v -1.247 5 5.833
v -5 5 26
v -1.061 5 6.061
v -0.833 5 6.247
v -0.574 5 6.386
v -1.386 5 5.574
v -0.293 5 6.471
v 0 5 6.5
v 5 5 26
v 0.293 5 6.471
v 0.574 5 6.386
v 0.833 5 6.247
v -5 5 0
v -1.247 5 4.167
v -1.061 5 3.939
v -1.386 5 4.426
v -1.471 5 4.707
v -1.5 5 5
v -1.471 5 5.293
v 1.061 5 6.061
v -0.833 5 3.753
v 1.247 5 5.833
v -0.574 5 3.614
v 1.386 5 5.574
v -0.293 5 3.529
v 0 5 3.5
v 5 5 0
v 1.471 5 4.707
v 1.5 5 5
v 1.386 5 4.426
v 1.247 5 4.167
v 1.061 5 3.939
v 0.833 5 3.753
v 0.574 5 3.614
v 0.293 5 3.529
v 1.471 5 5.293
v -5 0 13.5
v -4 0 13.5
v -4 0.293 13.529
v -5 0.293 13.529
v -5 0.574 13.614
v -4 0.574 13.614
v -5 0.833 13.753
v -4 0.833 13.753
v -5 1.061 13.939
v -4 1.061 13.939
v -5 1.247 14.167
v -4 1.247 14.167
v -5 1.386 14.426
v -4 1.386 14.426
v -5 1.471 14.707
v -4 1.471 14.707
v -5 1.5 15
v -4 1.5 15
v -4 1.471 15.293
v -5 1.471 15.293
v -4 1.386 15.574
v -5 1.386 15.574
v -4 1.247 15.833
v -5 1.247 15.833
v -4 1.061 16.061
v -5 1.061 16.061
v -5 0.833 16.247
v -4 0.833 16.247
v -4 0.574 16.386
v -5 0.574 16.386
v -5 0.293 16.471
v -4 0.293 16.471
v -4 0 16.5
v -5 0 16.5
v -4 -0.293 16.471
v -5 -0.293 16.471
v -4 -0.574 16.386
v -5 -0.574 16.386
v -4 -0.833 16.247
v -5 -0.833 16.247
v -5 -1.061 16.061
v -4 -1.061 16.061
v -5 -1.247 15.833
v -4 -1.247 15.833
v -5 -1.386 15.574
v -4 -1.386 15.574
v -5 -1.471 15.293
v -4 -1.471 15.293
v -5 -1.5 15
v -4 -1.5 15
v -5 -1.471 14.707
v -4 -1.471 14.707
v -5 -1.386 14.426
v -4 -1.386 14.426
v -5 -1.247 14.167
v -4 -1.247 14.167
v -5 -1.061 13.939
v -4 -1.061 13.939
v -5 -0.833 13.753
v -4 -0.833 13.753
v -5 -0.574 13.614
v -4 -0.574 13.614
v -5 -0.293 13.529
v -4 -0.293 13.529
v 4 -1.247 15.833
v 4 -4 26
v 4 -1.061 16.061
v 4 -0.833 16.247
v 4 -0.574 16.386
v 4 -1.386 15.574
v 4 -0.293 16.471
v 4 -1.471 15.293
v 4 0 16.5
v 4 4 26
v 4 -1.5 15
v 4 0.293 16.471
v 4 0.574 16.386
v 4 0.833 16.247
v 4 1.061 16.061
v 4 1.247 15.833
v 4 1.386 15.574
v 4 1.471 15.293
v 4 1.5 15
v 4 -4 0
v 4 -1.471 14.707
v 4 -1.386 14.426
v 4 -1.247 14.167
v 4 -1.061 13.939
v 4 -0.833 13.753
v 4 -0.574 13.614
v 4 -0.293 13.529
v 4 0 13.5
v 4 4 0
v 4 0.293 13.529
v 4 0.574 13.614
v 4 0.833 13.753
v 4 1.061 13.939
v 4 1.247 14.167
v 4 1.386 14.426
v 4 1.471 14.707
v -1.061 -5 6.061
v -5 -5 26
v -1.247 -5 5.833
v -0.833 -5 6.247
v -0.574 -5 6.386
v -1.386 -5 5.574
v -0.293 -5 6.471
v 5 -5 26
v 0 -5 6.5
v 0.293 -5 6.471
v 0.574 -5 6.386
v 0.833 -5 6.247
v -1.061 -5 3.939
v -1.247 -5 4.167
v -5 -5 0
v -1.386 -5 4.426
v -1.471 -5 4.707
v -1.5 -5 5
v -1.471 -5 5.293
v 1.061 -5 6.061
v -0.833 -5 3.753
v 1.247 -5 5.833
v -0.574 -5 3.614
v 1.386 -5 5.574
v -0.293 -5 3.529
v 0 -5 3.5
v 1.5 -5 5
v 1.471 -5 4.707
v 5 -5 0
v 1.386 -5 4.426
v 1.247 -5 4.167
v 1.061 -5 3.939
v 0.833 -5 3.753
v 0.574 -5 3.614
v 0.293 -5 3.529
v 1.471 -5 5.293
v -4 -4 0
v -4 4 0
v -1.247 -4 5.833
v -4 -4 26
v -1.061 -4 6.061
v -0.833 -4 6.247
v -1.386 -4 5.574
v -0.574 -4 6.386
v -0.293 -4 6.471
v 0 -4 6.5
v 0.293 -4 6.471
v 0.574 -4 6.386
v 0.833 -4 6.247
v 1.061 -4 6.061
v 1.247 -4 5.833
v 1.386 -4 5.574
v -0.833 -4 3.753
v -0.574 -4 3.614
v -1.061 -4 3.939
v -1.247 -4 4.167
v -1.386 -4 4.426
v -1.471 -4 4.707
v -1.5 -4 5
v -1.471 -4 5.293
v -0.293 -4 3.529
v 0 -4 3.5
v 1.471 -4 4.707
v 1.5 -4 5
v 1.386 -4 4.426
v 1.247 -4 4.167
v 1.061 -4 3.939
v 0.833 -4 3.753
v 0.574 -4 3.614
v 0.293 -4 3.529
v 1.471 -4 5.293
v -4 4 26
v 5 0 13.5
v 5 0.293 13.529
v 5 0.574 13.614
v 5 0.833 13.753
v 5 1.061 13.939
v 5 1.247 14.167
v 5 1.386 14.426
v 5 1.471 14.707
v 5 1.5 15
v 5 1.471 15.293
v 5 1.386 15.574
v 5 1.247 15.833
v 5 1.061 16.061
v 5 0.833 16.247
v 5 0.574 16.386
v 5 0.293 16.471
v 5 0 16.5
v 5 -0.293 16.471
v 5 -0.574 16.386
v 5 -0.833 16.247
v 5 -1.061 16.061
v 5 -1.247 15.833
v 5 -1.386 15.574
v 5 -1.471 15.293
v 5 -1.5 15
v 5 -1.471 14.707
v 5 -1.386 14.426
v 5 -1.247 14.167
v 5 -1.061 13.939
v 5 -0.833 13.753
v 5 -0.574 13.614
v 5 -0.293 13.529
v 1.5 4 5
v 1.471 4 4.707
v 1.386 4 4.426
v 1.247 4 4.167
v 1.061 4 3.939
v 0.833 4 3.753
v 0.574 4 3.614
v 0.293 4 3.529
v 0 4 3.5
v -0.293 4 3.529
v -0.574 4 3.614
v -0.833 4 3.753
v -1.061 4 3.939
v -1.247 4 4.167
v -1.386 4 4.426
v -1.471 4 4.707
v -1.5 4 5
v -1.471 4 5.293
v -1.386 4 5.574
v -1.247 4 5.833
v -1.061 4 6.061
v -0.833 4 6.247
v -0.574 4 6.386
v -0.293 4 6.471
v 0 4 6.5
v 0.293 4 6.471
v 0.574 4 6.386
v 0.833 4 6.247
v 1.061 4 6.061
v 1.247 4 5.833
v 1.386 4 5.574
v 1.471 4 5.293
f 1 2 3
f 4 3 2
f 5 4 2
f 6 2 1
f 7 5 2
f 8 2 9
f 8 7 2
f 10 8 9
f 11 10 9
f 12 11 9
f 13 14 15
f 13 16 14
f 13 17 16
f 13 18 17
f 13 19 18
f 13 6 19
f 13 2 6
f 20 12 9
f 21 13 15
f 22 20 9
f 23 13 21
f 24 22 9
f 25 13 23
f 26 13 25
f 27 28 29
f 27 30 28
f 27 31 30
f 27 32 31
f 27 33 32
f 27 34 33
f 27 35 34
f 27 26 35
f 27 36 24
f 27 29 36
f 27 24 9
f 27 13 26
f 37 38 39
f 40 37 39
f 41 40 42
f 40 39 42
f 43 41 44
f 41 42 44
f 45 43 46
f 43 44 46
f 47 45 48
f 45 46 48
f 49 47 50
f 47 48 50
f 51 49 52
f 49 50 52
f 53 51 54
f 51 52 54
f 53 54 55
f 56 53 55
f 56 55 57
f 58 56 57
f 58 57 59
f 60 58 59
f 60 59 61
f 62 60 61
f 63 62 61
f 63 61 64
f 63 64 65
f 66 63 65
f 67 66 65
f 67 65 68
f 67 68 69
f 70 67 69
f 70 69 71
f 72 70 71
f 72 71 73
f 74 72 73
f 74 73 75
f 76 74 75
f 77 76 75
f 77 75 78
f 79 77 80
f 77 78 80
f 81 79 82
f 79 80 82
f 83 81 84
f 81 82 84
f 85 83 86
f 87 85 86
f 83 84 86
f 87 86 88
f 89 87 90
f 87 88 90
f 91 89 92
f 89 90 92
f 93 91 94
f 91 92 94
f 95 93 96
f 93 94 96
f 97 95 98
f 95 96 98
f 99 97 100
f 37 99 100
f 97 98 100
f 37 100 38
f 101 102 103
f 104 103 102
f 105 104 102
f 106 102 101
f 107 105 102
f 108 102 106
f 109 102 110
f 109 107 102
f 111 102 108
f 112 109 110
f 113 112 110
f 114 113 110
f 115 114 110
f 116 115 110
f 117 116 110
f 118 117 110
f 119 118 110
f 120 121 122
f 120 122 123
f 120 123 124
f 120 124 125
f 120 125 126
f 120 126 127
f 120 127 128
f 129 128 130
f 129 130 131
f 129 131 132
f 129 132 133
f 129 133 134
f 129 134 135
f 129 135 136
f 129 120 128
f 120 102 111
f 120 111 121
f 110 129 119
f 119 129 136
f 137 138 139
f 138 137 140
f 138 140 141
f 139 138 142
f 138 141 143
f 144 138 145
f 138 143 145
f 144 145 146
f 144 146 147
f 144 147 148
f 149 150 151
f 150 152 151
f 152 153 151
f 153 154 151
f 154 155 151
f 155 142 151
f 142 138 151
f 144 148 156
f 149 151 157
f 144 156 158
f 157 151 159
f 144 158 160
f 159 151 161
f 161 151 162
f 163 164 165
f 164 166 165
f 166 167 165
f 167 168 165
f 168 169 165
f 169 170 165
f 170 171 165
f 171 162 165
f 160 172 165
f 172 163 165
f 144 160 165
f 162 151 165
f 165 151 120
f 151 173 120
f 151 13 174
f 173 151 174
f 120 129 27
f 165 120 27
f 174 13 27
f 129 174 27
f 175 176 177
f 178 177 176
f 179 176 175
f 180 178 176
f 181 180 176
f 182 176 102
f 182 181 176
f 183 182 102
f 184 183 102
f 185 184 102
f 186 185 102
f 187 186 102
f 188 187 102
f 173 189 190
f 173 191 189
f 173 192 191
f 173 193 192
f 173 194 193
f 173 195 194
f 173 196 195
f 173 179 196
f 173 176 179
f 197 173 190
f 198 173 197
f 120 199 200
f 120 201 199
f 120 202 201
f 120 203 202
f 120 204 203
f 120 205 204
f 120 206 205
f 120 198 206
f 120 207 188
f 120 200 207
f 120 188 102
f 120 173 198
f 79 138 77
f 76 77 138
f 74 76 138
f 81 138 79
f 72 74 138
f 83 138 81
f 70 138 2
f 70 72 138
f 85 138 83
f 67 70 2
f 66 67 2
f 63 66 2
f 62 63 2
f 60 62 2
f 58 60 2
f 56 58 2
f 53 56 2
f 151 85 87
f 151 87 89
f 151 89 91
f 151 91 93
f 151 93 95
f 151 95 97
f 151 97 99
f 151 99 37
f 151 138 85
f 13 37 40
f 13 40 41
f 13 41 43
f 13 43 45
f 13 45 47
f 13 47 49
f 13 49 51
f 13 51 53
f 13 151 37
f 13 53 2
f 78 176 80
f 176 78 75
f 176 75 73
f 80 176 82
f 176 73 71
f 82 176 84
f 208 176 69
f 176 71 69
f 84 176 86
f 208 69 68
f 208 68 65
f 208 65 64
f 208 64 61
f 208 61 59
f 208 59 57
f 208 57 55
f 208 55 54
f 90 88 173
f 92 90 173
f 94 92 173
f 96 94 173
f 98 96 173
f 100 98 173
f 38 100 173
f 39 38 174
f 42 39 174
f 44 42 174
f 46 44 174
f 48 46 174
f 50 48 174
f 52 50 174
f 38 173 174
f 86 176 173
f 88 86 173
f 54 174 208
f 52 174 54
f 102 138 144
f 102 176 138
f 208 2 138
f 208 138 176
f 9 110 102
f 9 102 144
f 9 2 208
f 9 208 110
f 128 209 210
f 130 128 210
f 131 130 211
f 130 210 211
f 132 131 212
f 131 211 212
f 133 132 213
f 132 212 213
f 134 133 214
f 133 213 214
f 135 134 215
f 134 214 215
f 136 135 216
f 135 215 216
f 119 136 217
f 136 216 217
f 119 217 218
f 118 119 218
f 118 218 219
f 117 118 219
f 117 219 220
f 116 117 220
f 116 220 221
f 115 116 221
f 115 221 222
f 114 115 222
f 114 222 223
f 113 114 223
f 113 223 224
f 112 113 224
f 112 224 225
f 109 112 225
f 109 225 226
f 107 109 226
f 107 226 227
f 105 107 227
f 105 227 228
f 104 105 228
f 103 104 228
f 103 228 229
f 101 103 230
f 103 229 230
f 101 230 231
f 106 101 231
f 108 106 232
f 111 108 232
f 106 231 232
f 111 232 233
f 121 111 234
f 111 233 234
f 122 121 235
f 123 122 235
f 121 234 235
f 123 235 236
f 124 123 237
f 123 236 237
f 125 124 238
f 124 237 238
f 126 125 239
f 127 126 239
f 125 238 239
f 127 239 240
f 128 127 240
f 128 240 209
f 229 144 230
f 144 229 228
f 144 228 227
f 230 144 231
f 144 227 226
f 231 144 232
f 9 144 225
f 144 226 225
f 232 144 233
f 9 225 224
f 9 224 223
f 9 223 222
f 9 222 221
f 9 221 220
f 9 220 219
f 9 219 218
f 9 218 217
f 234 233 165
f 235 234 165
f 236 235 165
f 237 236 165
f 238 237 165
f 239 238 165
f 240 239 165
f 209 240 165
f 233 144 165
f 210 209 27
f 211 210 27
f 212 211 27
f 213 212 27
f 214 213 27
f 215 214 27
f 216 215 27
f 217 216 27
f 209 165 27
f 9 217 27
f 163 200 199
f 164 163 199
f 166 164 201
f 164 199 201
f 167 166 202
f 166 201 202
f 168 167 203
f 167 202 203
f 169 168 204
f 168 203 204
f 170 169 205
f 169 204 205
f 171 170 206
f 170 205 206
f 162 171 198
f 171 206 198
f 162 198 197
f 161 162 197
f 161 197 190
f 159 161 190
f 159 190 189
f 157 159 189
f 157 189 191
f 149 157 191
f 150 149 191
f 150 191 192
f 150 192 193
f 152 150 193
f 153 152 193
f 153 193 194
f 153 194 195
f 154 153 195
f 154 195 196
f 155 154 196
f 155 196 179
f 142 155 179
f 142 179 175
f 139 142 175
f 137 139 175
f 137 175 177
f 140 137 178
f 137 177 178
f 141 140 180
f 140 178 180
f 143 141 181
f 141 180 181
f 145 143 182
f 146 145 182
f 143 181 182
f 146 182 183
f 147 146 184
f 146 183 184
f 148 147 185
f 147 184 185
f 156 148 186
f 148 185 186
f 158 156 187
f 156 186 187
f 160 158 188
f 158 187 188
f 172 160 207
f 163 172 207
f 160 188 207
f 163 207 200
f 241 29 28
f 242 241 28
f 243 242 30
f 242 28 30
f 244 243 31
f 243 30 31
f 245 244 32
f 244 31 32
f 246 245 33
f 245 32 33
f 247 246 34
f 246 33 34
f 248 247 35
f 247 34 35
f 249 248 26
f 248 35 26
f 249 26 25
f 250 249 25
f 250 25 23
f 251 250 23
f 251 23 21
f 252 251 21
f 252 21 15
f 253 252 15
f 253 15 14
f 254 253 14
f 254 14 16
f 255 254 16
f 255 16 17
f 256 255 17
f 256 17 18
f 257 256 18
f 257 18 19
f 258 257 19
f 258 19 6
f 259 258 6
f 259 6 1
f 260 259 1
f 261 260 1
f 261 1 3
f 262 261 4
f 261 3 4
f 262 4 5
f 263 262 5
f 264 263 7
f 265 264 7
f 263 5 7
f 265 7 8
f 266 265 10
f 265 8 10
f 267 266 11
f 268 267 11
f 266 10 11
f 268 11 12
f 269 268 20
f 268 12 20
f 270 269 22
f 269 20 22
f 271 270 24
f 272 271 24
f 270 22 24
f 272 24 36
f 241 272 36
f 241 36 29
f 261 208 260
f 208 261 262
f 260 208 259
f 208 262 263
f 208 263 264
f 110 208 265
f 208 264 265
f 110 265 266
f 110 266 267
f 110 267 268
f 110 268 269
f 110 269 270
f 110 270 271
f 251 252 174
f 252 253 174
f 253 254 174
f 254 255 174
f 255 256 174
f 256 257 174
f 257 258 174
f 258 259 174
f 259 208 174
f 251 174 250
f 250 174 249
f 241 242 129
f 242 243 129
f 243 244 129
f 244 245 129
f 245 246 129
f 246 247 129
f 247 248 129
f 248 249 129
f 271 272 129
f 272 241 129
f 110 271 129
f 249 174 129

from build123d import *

# Parameters (mm, degrees)
SKETCH_1_W          = 10
SKETCH_1_H          = 10
SKETCH_1_W_2        = 8
SKETCH_1_H_2        = 8
EXTRUDE_1_DEPTH     = 26
SKETCH_2_R          = 1.5
CUT_EXTRUDE_1_DEPTH = 50
SKETCH_3_R          = 1.5
CUT_EXTRUDE_2_DEPTH = 10


with BuildPart() as part:
    # 草图1 → 拉伸-薄壁1 (new body)
    with BuildSketch(Plane.XY):
        Rectangle(SKETCH_1_W, SKETCH_1_H)
        Rectangle(SKETCH_1_W_2, SKETCH_1_H_2, mode=Mode.SUBTRACT)
    extrude(amount=EXTRUDE_1_DEPTH)

    # 草图2 → 切除-拉伸1 (cut)
    with BuildSketch(Plane(origin=(0, 5, 0), x_dir=(1, 0, 0), z_dir=(0, 1, 0))):
        with Locations((0, -5)):
            Circle(SKETCH_2_R)
    extrude(amount=-CUT_EXTRUDE_1_DEPTH, mode=Mode.SUBTRACT)

    # 草图3 → 切除-拉伸2 (cut)
    with BuildSketch(Plane(origin=(5, 0, 0), x_dir=(0, 0, -1), z_dir=(1, 0, 0))):
        with Locations((-15, 0)):
            Circle(SKETCH_3_R)
    extrude(amount=-CUT_EXTRUDE_2_DEPTH, mode=Mode.SUBTRACT)


solid = part.part
